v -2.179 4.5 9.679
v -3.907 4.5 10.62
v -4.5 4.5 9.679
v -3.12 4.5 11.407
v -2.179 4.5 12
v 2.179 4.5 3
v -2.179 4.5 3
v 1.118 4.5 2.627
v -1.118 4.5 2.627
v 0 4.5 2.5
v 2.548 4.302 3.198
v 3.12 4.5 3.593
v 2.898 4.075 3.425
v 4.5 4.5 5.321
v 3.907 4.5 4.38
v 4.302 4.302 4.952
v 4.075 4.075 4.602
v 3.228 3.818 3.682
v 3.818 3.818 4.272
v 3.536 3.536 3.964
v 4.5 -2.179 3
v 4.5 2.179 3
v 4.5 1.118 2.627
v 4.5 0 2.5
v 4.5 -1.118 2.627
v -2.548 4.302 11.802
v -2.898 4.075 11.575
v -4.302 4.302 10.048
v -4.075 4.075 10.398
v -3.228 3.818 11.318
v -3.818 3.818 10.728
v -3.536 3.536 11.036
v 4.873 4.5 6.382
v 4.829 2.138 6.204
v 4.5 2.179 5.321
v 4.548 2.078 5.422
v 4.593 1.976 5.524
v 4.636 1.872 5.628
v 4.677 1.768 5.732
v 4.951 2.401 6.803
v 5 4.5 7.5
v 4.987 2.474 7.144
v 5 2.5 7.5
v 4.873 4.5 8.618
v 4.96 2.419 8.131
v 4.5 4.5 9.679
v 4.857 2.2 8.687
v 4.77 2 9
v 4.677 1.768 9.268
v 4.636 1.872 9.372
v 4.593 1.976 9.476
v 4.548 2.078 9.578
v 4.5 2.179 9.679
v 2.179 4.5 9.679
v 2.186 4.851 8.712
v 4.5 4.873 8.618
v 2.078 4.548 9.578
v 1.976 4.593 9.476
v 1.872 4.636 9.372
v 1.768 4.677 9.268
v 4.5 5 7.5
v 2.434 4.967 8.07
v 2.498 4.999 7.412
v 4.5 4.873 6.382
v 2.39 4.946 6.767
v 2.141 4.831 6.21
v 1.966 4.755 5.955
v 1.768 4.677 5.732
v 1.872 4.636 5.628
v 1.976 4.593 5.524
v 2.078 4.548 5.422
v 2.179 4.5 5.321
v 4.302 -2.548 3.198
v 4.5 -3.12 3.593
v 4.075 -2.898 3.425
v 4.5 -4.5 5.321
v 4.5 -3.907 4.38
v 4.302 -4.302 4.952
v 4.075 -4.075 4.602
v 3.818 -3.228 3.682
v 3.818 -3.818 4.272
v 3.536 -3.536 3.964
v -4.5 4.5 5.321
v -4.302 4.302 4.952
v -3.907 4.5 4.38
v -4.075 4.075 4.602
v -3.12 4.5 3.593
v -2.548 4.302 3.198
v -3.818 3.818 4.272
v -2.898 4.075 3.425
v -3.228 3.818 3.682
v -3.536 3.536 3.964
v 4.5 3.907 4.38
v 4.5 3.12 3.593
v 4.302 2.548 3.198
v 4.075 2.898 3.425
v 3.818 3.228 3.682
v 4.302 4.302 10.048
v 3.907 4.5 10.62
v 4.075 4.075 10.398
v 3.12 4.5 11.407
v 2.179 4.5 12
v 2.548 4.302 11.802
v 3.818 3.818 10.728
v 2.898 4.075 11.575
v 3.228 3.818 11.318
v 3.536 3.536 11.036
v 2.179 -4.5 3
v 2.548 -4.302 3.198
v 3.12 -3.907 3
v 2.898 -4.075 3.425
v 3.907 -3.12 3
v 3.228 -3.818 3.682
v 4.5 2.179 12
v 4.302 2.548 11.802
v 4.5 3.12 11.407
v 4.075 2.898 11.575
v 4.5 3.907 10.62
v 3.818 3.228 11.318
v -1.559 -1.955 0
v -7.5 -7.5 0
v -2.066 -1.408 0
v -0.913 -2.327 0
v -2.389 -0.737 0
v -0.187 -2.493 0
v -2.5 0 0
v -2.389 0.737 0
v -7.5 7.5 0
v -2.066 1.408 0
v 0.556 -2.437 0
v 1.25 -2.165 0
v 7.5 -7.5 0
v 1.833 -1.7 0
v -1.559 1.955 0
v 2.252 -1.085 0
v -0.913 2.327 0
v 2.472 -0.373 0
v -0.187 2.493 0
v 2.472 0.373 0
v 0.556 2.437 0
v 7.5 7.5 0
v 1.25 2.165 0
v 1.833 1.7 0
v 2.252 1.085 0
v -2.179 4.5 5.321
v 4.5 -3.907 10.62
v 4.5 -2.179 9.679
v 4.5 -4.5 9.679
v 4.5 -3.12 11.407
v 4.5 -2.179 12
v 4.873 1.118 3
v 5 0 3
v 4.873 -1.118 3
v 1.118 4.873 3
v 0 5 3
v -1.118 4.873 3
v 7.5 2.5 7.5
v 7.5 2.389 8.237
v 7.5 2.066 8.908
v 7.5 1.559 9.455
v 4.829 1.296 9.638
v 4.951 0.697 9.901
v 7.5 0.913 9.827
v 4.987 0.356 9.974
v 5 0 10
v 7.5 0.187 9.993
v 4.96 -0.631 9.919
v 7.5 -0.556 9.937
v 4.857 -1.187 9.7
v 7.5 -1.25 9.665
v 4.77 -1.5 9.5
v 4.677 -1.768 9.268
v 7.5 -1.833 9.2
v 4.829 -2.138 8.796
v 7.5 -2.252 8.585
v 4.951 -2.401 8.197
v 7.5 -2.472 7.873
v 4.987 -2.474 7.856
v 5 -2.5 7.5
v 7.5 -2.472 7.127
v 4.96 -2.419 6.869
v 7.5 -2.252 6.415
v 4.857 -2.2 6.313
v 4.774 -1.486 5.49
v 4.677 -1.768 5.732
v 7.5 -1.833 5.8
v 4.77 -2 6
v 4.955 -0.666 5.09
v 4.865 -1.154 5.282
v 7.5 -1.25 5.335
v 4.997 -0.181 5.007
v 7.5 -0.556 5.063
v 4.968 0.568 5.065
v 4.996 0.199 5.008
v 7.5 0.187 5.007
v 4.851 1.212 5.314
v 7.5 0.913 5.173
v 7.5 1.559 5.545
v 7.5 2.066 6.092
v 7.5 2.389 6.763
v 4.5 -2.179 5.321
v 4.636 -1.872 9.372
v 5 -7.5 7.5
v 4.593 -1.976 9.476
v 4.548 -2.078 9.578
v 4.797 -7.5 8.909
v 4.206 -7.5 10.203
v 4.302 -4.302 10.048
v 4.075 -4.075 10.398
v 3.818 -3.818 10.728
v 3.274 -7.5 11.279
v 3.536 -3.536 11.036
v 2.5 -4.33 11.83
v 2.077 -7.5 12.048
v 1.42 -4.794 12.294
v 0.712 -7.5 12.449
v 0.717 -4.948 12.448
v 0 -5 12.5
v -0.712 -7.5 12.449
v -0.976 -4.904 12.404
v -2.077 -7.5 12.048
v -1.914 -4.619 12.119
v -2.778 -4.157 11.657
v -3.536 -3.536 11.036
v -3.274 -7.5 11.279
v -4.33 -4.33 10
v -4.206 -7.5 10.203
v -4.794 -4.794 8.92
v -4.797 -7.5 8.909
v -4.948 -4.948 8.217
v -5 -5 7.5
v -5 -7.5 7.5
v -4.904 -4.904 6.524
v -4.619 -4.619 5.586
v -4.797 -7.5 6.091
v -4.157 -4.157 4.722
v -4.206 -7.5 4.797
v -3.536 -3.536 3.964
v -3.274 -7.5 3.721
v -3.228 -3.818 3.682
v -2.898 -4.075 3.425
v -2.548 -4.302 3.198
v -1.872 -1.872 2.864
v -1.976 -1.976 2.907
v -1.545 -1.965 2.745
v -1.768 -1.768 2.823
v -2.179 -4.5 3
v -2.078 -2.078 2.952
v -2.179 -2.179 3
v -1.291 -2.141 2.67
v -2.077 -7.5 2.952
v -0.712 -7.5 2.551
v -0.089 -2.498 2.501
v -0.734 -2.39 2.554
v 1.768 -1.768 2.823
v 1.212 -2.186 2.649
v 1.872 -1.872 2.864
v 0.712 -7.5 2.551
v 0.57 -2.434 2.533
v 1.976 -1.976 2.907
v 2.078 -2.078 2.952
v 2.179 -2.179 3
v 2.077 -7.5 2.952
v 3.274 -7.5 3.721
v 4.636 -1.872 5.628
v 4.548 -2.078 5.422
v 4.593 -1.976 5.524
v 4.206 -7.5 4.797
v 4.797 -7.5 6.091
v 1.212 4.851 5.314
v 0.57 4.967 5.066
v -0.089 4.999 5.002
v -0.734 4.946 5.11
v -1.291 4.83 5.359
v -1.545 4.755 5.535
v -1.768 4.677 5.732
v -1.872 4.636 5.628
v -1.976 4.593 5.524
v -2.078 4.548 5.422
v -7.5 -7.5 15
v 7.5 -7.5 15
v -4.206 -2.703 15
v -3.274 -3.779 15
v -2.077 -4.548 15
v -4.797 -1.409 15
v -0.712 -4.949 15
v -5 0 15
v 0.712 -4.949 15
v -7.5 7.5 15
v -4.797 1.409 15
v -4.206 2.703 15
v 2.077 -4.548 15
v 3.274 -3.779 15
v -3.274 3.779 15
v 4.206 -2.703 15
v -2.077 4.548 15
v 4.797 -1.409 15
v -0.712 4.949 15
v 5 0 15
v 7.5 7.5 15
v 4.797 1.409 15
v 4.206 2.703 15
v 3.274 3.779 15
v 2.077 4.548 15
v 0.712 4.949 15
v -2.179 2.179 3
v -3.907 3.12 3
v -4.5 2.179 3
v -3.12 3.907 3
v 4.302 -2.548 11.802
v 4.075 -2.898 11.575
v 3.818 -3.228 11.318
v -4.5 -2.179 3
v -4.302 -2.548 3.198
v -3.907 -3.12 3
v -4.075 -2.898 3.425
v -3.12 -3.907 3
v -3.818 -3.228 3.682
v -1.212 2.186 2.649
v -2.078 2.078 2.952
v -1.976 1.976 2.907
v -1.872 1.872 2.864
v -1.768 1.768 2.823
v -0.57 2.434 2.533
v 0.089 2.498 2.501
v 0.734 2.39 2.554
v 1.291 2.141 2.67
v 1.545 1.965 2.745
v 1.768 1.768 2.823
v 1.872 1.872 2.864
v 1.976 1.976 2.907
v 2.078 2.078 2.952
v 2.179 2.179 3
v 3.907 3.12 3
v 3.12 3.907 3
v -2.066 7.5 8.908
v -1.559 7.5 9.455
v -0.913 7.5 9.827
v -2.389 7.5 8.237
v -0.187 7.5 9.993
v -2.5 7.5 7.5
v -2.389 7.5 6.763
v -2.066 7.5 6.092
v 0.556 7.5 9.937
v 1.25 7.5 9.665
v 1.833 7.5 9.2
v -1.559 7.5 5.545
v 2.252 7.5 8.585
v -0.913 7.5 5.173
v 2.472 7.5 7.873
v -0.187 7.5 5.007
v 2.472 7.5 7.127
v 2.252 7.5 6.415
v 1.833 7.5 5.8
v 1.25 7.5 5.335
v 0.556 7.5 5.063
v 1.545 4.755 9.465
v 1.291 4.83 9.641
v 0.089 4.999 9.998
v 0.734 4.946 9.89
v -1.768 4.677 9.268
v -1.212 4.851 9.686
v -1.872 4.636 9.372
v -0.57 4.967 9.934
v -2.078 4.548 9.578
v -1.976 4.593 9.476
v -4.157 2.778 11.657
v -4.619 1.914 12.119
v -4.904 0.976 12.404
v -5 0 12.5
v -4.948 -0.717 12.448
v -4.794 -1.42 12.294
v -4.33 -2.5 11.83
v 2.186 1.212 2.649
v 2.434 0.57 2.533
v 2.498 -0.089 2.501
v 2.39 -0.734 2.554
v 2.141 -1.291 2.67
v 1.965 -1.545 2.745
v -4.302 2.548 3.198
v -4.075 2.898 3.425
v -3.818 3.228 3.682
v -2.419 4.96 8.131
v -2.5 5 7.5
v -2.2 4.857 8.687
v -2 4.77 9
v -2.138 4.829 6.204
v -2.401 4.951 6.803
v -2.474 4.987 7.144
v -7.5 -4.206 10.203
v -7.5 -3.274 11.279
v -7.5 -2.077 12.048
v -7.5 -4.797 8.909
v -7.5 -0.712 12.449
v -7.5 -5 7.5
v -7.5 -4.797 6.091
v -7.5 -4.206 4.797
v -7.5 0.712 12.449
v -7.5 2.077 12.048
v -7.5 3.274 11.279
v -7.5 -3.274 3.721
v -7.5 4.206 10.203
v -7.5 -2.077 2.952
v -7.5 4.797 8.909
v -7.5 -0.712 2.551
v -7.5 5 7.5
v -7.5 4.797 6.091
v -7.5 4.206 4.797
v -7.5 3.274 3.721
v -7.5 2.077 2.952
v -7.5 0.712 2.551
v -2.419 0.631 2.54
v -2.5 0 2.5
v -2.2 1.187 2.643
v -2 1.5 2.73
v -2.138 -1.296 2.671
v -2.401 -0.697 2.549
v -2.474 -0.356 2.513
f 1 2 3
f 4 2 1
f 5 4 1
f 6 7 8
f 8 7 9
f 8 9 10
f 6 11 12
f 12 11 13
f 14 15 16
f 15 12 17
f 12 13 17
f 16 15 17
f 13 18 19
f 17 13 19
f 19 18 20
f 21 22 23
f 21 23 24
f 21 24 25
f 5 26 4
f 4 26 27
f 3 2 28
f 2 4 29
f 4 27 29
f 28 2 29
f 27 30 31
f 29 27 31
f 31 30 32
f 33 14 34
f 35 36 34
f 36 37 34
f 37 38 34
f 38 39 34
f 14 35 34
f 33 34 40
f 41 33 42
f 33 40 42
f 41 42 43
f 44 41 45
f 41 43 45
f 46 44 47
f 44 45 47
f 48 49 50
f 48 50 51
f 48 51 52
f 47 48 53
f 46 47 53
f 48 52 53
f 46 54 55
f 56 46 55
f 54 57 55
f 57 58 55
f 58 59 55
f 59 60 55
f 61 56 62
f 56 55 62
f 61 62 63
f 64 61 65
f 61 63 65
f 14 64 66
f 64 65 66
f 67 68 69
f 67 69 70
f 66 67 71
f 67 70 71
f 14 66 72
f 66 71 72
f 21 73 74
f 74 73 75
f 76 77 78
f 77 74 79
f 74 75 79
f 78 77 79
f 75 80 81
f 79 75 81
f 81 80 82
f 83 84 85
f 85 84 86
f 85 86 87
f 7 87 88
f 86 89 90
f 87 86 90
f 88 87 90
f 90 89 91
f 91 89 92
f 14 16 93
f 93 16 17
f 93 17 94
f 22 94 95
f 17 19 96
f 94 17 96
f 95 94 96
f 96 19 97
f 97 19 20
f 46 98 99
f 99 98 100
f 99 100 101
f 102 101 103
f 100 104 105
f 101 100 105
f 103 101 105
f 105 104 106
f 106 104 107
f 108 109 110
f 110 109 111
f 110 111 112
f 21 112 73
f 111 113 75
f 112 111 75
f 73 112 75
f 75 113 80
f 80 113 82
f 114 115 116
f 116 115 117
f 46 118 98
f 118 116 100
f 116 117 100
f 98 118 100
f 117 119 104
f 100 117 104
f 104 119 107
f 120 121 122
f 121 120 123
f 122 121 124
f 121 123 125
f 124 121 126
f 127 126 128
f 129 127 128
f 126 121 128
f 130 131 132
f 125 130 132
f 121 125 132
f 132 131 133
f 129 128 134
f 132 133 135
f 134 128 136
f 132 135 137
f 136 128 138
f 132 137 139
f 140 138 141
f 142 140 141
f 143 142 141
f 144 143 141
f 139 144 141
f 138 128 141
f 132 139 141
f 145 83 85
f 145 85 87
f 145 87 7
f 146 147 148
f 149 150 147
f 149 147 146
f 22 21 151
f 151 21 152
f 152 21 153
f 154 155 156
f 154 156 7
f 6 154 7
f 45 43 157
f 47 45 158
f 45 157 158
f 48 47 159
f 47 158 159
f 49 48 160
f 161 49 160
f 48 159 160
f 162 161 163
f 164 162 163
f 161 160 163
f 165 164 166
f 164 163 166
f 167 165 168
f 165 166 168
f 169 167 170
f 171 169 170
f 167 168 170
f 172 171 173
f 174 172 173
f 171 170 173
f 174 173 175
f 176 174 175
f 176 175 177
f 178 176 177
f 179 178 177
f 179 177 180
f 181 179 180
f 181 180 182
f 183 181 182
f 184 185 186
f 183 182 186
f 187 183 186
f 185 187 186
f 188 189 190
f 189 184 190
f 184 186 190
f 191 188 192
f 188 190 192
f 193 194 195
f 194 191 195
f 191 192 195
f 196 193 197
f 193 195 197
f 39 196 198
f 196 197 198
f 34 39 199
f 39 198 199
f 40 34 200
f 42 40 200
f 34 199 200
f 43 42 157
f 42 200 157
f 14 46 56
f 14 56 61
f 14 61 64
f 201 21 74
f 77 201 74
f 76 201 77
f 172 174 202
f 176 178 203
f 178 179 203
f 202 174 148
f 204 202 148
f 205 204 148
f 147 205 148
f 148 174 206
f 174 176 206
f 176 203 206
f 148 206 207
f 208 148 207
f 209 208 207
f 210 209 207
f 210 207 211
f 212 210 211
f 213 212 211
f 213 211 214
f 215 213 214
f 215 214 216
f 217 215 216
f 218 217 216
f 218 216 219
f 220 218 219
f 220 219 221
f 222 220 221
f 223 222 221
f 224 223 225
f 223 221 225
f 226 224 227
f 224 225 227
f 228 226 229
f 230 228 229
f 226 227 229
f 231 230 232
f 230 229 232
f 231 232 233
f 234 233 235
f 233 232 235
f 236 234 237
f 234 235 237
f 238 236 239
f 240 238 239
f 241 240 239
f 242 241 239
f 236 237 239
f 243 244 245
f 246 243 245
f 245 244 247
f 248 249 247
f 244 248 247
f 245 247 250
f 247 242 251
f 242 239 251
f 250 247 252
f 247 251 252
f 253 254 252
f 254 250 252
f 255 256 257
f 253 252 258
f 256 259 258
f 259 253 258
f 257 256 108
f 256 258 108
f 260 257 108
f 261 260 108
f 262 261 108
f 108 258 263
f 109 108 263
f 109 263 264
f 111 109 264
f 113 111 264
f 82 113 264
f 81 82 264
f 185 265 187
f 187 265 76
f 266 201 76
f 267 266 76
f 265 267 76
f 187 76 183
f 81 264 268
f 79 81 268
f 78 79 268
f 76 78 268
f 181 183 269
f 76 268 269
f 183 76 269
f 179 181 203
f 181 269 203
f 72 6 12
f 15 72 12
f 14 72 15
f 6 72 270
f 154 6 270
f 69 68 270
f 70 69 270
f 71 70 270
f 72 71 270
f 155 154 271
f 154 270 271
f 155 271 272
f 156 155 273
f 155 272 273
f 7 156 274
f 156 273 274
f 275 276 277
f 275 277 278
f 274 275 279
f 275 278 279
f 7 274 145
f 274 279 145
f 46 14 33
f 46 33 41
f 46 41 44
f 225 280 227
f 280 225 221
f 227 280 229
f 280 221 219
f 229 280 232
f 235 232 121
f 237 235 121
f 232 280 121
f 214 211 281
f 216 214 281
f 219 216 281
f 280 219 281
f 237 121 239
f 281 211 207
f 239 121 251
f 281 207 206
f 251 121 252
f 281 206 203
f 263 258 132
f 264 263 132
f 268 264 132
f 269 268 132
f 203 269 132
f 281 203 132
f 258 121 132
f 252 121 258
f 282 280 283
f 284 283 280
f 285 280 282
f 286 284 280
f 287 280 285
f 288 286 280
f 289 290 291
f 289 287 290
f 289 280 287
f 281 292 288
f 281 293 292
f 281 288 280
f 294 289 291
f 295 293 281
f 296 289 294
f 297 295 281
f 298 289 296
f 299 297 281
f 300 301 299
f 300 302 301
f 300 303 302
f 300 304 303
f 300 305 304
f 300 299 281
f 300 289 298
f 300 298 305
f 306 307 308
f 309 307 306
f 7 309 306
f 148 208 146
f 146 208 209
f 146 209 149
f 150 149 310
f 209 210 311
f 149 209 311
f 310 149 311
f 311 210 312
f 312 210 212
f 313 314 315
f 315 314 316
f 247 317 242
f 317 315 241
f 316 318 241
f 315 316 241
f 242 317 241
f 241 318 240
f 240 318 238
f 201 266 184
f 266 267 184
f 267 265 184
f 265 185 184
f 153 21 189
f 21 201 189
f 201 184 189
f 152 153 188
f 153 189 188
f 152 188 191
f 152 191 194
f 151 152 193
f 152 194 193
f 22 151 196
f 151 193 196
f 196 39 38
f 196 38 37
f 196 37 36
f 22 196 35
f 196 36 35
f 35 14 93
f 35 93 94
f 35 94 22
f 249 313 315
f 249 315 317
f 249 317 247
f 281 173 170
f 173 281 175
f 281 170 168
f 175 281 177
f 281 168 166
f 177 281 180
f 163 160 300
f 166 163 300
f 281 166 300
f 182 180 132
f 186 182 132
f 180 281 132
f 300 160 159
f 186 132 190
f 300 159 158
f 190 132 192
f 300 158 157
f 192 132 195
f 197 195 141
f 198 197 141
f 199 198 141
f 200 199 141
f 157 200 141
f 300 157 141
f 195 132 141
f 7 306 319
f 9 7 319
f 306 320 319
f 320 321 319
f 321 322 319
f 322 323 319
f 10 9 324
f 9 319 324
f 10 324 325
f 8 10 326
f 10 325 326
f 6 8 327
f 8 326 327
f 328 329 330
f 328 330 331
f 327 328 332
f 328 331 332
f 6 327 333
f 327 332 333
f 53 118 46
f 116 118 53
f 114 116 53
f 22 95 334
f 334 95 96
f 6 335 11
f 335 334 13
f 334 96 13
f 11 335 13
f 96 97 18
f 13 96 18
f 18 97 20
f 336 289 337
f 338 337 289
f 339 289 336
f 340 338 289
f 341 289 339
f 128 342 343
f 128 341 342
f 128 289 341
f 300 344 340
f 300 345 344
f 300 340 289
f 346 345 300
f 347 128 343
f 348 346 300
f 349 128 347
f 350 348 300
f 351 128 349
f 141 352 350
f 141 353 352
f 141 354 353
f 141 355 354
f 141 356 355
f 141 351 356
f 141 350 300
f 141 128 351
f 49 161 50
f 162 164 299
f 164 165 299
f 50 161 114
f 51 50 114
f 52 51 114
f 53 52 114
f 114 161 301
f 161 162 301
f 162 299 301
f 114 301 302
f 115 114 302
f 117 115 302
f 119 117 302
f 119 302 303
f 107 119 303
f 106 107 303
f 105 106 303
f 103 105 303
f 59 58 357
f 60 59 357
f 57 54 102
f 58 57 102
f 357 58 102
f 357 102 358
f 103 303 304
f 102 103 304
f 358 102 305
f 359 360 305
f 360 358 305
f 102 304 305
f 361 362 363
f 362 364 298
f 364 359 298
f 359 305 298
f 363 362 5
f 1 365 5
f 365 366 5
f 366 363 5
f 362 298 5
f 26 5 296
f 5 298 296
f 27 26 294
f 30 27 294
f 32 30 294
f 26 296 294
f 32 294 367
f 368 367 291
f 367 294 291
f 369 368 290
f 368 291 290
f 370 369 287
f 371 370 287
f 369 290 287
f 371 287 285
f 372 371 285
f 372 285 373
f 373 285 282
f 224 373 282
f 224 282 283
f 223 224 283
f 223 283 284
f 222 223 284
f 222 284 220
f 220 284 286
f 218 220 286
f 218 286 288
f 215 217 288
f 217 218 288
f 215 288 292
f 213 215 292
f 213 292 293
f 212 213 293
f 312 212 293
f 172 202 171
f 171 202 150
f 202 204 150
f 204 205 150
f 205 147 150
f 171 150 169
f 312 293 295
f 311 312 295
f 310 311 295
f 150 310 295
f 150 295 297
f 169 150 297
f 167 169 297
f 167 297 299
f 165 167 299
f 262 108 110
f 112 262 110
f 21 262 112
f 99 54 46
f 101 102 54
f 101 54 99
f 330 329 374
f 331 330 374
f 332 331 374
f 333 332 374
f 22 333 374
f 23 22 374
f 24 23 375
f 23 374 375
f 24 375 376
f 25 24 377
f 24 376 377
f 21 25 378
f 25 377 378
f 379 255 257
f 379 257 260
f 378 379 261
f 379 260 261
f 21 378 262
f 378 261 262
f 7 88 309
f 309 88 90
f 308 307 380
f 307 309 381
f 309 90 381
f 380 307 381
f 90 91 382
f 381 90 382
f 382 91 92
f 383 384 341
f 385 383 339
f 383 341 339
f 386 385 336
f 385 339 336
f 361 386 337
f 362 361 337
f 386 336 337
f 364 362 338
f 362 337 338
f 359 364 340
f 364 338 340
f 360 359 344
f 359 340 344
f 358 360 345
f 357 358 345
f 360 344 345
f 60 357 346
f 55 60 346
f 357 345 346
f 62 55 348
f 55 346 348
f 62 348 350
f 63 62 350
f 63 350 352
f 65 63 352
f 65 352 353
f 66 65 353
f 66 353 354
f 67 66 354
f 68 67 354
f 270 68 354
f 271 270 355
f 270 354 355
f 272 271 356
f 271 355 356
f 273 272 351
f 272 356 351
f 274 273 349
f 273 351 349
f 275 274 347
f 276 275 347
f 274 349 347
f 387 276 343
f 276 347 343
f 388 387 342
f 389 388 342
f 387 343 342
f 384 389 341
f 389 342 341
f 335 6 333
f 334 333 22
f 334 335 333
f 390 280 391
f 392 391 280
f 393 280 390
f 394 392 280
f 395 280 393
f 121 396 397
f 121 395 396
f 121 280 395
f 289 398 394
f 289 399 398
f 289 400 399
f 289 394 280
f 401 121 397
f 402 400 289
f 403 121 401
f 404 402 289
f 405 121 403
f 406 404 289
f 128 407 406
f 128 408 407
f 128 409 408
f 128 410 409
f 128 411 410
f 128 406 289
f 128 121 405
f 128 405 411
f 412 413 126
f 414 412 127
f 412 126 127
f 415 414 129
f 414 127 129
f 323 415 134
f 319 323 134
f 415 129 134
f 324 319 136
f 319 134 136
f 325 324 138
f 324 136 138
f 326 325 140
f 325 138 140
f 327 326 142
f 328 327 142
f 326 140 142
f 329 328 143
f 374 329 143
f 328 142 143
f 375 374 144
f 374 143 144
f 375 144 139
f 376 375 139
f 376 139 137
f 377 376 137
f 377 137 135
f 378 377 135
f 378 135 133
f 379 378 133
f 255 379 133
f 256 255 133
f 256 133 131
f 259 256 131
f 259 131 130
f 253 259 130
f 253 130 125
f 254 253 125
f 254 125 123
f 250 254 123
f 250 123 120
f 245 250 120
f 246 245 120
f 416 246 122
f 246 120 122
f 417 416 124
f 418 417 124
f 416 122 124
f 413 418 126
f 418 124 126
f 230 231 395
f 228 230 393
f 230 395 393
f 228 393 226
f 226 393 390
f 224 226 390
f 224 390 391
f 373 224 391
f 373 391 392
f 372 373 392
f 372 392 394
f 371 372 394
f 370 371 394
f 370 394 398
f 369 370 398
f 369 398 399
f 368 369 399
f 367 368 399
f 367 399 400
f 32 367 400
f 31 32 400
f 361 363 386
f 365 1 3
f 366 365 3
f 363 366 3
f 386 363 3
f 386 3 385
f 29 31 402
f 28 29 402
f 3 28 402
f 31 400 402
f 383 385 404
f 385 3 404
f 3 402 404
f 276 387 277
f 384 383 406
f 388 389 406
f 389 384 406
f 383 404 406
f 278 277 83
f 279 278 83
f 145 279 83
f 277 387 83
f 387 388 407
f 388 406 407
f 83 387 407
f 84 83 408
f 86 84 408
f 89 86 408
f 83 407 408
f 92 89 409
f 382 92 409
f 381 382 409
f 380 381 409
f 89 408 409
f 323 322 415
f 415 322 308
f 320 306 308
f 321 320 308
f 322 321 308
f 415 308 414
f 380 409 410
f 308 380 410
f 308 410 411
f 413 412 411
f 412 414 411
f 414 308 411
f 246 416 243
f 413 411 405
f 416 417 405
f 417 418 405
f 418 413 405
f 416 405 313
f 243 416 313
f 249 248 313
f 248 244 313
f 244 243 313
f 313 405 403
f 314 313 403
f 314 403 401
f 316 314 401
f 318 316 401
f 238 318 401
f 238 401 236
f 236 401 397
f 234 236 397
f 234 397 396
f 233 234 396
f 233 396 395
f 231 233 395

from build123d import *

# Parameters (mm, degrees)
F0_W                 = 15
F0_H                 = 15
F1_DEPTH             = 15
F5_D                 = 5
F5_CBORE_D           = 10
F5_CBORE_DEPTH       = 12
F5_ON_F3_D           = 5
F5_ON_F3_CBORE_D     = 10
F5_ON_F3_CBORE_DEPTH = 12
F5_ON_F4_D           = 5
F5_ON_F4_CBORE_D     = 10
F5_ON_F4_CBORE_DEPTH = 12


with BuildPart() as f1:
    # F0 (on Top) → F1 (new body)
    with BuildSketch(Plane.XY):
        Rectangle(F0_W, F0_H)
    extrude(amount=F1_DEPTH)

    # F5 (through all)
    with Locations(Plane.XZ.offset(7.5)):
        with Locations((0, 7.5)):
            CounterBoreHole(F5_D / 2, F5_CBORE_D / 2, F5_CBORE_DEPTH)

    # F5 on F3 (through all)
    with Locations(Plane(origin=(-7.5, 0, 0), x_dir=(0, -1, 0), z_dir=(-1, 0, 0))):
        with Locations((0, 7.5)):
            CounterBoreHole(F5_ON_F3_D / 2, F5_ON_F3_CBORE_D / 2, F5_ON_F3_CBORE_DEPTH)

    # F5 on F4 (through all)
    with Locations(Plane.XY.offset(15)):
        with Locations((0, 0)):
            CounterBoreHole(F5_ON_F4_D / 2, F5_ON_F4_CBORE_D / 2, F5_ON_F4_CBORE_DEPTH)


solid = f1.part
